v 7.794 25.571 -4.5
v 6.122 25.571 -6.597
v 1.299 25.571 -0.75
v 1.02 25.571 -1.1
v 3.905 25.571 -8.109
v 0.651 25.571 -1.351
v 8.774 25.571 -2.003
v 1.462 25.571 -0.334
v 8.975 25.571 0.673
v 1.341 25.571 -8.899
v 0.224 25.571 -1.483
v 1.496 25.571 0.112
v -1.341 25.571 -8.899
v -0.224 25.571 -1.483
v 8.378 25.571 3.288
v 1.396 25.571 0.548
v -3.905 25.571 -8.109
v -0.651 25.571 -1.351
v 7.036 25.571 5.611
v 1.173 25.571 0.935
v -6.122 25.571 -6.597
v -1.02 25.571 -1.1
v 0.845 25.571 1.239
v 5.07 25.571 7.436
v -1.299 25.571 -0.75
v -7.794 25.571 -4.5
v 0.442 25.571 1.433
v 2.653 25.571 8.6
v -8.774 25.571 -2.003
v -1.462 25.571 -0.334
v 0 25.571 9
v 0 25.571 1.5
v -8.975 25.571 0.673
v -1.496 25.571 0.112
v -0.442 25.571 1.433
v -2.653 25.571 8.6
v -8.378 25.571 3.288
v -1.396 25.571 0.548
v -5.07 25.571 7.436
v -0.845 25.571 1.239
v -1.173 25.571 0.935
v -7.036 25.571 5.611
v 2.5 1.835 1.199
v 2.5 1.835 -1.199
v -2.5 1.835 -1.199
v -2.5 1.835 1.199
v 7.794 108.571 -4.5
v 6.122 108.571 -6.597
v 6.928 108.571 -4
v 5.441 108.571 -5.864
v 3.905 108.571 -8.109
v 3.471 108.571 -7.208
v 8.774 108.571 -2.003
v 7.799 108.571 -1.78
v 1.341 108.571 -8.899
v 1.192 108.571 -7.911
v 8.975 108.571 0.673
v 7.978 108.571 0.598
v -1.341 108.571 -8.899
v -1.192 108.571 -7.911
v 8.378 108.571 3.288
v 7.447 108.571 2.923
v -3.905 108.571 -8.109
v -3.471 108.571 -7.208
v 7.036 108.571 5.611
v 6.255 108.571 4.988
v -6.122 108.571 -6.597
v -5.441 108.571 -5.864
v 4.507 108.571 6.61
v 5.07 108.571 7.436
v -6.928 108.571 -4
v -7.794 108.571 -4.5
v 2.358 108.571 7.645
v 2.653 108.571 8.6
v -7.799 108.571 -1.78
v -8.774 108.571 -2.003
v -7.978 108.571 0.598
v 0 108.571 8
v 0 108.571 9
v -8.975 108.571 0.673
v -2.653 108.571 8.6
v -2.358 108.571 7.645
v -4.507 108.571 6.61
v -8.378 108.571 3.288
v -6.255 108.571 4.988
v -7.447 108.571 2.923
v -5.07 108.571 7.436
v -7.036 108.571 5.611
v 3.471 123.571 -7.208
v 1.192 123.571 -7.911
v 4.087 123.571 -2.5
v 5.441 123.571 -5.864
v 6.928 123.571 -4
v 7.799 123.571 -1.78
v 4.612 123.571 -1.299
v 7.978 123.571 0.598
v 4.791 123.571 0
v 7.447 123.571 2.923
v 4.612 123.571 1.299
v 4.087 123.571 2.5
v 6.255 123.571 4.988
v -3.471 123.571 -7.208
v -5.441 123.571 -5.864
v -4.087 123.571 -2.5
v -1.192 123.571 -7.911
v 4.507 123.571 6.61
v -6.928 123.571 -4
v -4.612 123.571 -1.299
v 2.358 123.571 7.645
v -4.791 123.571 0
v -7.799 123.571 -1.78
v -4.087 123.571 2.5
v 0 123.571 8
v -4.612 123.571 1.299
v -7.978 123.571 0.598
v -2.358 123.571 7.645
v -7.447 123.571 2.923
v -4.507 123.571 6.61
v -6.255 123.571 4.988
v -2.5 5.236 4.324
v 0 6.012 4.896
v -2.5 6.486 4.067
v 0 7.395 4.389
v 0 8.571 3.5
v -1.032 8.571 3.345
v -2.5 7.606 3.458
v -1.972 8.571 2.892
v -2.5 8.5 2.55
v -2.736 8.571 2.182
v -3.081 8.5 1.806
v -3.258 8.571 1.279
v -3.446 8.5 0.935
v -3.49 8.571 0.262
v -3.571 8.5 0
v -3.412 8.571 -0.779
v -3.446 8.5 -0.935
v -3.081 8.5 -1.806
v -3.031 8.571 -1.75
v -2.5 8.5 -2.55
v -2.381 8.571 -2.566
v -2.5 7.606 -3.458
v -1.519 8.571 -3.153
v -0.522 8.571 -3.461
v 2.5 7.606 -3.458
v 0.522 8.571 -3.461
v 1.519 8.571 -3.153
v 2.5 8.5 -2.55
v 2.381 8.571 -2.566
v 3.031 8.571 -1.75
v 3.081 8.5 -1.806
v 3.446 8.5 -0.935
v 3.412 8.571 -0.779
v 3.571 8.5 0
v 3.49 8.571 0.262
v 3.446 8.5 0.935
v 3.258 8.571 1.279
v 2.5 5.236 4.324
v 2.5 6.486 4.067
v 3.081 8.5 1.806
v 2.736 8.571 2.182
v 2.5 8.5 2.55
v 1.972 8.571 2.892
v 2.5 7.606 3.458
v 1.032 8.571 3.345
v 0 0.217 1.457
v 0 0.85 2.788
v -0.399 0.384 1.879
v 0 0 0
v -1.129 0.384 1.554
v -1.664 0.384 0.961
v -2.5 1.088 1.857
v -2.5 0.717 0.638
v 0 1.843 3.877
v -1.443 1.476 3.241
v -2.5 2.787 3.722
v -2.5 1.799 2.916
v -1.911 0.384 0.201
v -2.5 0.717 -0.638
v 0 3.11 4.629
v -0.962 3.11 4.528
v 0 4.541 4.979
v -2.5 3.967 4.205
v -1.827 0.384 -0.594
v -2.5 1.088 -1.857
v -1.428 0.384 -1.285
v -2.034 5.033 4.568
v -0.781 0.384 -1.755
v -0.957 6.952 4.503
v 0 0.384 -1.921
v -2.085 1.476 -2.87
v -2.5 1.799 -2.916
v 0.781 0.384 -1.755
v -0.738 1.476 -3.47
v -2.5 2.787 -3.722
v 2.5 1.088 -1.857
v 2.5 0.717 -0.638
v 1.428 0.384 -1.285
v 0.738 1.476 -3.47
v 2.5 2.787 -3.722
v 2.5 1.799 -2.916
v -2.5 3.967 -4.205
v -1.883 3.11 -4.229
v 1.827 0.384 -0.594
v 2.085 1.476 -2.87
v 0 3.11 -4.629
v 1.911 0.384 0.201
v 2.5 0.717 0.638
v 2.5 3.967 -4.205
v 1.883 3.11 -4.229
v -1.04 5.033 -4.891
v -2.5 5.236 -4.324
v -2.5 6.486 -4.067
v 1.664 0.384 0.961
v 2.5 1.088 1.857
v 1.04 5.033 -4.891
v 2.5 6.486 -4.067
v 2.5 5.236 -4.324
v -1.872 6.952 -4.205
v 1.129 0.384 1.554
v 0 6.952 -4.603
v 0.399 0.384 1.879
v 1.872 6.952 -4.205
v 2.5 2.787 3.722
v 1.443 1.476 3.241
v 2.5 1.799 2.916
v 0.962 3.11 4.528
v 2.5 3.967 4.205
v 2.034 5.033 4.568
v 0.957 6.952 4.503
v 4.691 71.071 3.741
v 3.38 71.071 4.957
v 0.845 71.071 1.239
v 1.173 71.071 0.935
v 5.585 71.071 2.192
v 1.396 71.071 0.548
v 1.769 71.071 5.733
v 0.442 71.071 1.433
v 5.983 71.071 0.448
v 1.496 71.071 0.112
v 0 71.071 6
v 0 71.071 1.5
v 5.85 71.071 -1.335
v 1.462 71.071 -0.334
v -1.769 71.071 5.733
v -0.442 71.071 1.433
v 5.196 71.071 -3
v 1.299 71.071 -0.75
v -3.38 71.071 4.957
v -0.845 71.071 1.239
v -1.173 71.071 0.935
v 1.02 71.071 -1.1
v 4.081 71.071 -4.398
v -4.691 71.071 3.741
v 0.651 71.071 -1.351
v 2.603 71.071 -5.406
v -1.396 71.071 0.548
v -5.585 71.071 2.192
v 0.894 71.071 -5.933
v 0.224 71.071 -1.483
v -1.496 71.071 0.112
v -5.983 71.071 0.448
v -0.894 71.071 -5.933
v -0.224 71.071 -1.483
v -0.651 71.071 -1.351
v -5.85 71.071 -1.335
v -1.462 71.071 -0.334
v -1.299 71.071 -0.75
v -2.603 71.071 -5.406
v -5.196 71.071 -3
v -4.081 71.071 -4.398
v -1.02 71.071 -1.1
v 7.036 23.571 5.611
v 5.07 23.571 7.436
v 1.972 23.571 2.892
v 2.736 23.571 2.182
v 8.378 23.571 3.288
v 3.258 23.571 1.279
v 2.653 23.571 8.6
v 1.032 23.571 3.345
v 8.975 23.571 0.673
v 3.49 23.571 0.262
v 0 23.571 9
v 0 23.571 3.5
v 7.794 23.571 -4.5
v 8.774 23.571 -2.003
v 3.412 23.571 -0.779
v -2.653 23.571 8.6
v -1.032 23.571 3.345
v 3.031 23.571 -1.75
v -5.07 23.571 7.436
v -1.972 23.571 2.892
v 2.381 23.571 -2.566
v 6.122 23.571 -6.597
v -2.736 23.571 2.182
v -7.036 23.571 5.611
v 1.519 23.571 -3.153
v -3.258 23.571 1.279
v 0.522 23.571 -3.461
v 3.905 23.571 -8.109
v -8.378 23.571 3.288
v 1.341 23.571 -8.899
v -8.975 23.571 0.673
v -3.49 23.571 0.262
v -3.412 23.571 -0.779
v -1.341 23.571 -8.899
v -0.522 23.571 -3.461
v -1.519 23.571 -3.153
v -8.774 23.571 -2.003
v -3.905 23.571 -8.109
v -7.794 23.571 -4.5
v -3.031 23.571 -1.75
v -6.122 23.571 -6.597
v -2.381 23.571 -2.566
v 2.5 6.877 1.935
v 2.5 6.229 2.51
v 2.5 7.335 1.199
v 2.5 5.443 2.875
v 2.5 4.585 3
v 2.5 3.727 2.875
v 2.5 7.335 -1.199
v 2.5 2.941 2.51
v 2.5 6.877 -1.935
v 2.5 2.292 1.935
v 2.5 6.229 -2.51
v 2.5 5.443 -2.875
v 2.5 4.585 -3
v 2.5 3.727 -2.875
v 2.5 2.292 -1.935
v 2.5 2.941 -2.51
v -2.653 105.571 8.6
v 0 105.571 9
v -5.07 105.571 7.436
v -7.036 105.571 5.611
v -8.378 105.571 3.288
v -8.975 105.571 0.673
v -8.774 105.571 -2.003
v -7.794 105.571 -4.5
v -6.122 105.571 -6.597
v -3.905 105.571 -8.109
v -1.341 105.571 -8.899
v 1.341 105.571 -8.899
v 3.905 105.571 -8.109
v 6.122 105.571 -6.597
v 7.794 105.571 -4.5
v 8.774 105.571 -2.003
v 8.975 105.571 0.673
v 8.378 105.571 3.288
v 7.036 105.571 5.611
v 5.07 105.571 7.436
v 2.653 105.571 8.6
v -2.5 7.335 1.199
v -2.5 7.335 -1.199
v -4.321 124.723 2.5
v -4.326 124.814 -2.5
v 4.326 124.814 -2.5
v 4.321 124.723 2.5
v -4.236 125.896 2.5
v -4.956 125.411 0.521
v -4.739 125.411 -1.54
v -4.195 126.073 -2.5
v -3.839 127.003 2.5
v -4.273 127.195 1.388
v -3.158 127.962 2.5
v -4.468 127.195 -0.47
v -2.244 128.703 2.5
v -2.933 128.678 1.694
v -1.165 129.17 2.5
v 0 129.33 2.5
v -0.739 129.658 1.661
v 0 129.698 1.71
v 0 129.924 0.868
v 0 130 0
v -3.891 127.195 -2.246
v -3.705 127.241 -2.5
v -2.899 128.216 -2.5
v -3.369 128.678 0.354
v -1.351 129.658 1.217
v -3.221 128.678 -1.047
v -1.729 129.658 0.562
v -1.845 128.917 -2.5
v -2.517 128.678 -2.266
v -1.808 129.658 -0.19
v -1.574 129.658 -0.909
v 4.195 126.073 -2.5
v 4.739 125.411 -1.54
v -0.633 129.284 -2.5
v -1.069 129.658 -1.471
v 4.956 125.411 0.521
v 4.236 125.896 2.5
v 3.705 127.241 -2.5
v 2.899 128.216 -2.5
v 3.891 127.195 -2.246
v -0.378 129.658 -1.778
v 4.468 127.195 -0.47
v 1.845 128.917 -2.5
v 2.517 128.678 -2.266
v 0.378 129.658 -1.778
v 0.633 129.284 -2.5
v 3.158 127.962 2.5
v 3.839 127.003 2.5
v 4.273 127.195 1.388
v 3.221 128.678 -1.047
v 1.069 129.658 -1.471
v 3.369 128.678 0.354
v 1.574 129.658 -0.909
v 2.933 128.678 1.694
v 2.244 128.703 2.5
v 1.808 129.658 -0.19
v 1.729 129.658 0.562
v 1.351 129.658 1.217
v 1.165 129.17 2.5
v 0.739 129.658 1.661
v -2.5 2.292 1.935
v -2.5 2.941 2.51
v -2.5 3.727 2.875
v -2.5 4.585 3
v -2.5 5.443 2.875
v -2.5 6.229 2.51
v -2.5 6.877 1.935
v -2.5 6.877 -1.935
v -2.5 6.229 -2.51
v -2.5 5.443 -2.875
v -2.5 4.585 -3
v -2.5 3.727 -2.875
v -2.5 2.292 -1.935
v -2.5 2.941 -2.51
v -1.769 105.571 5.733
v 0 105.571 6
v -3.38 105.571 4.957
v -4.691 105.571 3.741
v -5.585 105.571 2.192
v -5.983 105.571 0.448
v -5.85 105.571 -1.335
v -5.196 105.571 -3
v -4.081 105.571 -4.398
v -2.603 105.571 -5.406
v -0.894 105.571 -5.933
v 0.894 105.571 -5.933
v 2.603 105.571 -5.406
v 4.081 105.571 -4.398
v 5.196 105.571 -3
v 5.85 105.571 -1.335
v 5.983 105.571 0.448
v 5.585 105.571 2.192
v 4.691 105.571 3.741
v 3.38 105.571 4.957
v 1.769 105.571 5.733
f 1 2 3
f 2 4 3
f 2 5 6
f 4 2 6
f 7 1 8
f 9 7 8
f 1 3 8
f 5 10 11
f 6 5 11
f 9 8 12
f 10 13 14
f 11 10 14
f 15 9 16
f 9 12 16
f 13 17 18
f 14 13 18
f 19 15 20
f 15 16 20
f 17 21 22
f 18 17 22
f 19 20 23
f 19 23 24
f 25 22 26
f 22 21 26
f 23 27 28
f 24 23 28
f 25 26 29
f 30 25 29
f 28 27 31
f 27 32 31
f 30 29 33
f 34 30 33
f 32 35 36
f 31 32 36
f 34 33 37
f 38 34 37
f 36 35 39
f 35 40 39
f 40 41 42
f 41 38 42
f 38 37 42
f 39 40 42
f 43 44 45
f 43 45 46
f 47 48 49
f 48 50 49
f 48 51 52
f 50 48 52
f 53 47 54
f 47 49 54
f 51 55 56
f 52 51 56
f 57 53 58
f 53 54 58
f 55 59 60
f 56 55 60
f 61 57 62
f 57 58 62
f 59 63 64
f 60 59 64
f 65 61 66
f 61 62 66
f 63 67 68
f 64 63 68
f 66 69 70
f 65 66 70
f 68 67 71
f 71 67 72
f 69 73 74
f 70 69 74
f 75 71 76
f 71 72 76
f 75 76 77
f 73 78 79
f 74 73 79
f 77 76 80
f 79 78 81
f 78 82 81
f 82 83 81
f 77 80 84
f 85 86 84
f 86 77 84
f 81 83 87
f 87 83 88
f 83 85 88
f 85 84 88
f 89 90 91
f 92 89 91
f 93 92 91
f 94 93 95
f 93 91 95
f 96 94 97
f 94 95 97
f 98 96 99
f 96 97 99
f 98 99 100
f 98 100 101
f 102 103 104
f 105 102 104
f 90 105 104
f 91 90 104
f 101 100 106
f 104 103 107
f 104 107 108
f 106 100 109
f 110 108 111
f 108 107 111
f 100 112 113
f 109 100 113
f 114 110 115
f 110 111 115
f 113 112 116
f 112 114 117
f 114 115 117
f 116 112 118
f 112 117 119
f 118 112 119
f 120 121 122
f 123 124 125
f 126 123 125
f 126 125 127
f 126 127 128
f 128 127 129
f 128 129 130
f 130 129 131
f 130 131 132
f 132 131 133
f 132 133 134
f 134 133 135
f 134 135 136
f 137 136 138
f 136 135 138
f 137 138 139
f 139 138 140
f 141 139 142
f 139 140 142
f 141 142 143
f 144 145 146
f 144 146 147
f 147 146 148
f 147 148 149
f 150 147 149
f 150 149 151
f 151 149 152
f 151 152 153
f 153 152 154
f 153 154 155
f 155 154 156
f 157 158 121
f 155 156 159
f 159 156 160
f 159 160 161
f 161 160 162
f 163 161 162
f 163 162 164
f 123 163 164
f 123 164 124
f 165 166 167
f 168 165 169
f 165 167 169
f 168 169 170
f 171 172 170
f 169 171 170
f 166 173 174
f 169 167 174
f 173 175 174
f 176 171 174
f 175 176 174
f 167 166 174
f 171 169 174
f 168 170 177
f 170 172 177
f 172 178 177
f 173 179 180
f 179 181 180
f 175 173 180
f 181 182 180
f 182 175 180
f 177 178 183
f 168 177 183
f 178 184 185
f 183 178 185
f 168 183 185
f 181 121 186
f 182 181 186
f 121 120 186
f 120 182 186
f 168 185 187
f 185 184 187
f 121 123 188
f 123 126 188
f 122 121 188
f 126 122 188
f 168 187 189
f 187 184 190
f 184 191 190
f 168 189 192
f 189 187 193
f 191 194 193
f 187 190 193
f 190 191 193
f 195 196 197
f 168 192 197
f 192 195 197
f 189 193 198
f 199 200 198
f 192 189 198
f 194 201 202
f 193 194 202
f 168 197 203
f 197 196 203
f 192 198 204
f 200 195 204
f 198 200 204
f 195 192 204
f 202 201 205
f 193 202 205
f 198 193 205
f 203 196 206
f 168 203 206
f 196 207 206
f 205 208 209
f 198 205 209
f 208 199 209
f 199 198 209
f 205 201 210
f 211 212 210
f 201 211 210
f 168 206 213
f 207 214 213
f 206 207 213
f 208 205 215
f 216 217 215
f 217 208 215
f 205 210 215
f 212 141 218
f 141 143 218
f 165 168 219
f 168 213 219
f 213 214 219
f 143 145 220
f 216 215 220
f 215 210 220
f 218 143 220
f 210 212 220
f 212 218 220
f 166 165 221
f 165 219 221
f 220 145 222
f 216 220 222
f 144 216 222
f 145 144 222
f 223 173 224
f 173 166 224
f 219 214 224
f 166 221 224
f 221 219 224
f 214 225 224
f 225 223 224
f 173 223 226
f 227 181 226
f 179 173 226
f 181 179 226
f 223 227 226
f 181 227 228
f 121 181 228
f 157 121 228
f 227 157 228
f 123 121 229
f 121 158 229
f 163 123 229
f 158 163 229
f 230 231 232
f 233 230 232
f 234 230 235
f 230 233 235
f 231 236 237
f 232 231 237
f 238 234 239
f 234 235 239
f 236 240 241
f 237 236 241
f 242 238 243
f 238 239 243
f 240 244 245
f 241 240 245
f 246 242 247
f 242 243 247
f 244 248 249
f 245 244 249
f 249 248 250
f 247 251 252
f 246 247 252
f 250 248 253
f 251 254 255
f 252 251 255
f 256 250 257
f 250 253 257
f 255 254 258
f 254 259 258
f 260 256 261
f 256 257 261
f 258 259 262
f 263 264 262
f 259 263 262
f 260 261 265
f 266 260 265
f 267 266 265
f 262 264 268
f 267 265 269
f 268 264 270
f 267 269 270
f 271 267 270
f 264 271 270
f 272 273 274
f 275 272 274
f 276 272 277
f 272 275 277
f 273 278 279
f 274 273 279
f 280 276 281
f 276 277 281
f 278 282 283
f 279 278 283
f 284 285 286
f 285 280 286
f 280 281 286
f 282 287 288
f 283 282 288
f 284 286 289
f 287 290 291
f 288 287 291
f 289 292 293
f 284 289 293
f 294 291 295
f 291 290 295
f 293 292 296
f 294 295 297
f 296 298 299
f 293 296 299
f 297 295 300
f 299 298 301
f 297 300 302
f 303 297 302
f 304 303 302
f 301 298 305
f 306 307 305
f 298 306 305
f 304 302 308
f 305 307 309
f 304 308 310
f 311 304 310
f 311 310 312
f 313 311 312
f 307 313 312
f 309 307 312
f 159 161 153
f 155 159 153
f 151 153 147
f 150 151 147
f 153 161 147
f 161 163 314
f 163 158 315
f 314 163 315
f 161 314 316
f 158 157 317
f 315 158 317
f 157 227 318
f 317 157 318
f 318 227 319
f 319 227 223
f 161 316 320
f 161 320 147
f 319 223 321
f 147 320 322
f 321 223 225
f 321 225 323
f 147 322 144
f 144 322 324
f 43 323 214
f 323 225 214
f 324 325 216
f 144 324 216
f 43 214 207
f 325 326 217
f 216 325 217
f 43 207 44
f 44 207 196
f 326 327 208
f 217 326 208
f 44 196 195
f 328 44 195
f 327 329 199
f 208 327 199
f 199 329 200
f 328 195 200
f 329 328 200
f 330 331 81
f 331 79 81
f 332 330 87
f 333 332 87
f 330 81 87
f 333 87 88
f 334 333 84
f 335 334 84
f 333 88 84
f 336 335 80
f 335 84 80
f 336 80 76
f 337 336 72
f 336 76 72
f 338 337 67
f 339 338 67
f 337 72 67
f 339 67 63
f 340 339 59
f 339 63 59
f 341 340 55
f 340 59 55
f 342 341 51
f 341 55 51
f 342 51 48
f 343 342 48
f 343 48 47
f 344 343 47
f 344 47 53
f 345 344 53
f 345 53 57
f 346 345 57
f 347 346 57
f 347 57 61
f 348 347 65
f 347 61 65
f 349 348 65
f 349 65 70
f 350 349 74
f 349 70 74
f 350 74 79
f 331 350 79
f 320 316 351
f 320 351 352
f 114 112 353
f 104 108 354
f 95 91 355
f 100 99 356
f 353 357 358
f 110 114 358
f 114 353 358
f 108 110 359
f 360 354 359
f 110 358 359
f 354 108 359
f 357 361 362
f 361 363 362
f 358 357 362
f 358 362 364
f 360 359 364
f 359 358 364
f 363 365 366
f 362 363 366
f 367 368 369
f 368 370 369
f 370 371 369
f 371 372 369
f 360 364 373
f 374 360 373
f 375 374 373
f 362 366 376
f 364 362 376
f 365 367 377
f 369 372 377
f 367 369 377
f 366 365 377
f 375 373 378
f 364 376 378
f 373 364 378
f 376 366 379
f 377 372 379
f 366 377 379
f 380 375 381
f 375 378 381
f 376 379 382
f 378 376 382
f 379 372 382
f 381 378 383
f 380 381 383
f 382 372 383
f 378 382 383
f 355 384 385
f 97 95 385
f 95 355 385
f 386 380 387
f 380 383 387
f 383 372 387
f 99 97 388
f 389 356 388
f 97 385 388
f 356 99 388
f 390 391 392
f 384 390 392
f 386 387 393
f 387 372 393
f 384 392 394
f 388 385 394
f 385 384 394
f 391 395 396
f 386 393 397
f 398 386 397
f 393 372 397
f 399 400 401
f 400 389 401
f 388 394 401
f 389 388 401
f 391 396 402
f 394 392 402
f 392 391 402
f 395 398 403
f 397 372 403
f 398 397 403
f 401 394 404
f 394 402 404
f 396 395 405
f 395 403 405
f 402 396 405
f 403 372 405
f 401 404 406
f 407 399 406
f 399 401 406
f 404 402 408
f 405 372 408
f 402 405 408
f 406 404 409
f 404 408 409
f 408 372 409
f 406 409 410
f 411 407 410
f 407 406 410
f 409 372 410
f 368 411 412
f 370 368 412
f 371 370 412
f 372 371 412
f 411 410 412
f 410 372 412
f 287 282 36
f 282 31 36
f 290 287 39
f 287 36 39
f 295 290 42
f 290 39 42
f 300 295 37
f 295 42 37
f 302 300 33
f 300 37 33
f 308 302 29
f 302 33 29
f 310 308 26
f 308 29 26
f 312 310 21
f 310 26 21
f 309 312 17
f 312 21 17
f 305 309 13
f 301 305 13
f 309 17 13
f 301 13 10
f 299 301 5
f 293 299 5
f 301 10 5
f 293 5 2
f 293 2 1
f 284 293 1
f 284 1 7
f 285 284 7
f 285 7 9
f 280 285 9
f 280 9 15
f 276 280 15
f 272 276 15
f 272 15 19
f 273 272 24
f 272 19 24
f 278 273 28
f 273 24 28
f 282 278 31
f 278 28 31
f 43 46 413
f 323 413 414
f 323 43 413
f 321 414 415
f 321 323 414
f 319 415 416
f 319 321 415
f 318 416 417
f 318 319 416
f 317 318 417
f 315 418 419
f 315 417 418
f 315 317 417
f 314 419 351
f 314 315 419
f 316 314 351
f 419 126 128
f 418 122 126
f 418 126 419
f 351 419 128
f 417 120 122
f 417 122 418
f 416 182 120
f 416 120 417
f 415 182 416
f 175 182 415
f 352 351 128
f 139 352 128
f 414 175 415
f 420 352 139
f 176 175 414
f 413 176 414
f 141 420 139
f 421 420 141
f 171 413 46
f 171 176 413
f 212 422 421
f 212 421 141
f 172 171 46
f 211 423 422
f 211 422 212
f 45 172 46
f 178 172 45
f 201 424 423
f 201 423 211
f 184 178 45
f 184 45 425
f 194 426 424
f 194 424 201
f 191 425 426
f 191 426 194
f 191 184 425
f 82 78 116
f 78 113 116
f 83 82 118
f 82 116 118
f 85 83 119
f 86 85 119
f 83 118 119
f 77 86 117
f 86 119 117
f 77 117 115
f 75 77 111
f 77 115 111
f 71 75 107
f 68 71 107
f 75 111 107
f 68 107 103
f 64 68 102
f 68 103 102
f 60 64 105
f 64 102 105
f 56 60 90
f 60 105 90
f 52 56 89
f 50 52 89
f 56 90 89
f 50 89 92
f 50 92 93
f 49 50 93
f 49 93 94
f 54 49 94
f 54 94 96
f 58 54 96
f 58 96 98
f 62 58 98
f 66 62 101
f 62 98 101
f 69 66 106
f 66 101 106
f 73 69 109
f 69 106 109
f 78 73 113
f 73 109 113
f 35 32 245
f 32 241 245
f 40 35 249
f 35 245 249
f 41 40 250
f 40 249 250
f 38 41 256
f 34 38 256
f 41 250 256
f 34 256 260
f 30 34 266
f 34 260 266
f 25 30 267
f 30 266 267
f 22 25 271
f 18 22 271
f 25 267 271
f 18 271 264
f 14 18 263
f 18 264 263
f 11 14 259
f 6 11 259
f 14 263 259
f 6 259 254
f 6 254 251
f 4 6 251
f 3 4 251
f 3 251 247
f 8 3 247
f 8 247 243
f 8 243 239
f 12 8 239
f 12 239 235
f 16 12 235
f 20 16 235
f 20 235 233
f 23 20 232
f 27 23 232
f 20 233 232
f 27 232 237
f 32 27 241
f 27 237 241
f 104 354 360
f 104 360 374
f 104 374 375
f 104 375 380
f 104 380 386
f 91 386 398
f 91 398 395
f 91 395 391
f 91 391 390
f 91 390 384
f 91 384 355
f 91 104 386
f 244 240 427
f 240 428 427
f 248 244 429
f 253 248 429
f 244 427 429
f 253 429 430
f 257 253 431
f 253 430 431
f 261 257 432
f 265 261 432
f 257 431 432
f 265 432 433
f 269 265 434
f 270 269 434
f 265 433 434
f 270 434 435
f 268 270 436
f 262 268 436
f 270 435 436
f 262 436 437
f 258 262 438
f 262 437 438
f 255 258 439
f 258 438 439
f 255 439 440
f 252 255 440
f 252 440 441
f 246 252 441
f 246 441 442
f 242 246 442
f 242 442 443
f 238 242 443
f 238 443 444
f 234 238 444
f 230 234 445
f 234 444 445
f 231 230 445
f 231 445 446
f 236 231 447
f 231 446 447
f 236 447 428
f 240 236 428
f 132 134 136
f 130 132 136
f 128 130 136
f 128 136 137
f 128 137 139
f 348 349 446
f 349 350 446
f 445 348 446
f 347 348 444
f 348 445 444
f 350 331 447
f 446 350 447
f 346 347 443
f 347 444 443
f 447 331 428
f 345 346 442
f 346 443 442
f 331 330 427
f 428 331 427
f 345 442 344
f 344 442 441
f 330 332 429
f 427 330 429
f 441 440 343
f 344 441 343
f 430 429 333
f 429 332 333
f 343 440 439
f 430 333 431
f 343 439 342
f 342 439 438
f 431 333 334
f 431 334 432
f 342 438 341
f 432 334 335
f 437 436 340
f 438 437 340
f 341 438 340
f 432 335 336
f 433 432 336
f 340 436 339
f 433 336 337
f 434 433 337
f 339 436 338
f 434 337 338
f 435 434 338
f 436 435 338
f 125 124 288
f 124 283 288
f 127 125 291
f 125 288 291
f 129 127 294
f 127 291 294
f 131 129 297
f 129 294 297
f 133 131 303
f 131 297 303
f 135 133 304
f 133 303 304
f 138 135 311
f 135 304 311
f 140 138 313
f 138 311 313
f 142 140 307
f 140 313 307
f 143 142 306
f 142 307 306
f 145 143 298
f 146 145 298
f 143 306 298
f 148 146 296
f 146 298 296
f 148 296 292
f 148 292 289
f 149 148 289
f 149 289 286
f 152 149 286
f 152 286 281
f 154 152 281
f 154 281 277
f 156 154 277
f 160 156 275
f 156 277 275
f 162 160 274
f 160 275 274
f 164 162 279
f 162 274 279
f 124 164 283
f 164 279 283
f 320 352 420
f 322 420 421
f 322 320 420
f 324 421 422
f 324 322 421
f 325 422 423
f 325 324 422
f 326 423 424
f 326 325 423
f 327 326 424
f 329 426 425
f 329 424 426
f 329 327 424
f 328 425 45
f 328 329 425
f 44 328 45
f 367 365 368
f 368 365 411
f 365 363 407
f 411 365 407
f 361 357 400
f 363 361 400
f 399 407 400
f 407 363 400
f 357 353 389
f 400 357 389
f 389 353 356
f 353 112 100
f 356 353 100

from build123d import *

# Parameters (mm, degrees)
SKETCH_2_OUTSIDE_W   = 46.494
SKETCH_2_OUTSIDE_H   = 46.494
SKETCH_2_OUTSIDE_W_2 = 10
SKETCH_2_OUTSIDE_H_2 = 5
CUT_EXTRUDE_1_DEPTH  = 10
SKETCH_3_OUTSIDE_W   = 46.494
SKETCH_3_OUTSIDE_H   = 46.494
SKETCH_3_OUTSIDE_W_2 = 5
SKETCH_3_OUTSIDE_H_2 = 20
CUT_EXTRUDE_2_DEPTH  = 8.5
CUT_EXTRUDE_3_DEPTH  = 131.817621137


with BuildPart() as part:
    # Эскиз1 → Повернуть2 (revolve)
    with BuildSketch(Plane.XY, mode=Mode.PRIVATE) as revolve_2_sk:
        with BuildLine():
            Line((-3.5, 8.570714214), (-3.5, 23.570714214))
            Line((-3.5, 23.570714214), (-9, 23.570714214))
            Line((-9, 23.570714214), (-9, 25.570714214))
            Line((-9, 25.570714214), (-1.5, 25.570714214))
            Line((-1.5, 25.570714214), (-1.5, 71.070714214))
            Line((-1.5, 71.070714214), (-6, 71.070714214))
            Line((-6, 71.070714214), (-6, 105.570714214))
            Line((-6, 105.570714214), (-9, 105.570714214))
            Line((-9, 105.570714214), (-9, 108.570714214))
            Line((-9, 108.570714214), (-8, 108.570714214))
            Line((-8, 108.570714214), (-8, 123.570714214))
            Line((-8, 123.570714214), (-4.791361199, 123.570714214))
            ThreePointArc((-4.791361199, 123.570714214), (-4.009141362, 127.987772671), (0, 130))
            Line((0, 130), (0, 125))
            Line((0, 125), (0, 0))
            ThreePointArc((0, 0), (-4.628907596, 3.109705191), (-3.5, 8.570714214))
        make_face()
    revolve(revolve_2_sk.sketch.rotate(Axis((0, 125, 0), (0, -1, 0)), 270), axis=Axis((0, 125, 0), (0, -1, 0)))

    # Эскиз2 outside → Вырез-Вытянуть1 (cut)
    with BuildSketch(Plane(origin=(0, 123.570714214, 0), x_dir=(1, 0, 0), z_dir=(0, 1, 0))):
        Rectangle(SKETCH_2_OUTSIDE_W, SKETCH_2_OUTSIDE_H)
        Rectangle(SKETCH_2_OUTSIDE_W_2, SKETCH_2_OUTSIDE_H_2, mode=Mode.SUBTRACT)
    extrude(amount=CUT_EXTRUDE_1_DEPTH, mode=Mode.SUBTRACT)

    # Эскиз3 outside → Вырез-Вытянуть2 (cut)
    with BuildSketch(Plane(origin=(0, 0, 0), x_dir=(1, 0, 0), z_dir=(0, 1, 0))):
        Rectangle(SKETCH_3_OUTSIDE_W, SKETCH_3_OUTSIDE_H)
        Rectangle(SKETCH_3_OUTSIDE_W_2, SKETCH_3_OUTSIDE_H_2, mode=Mode.SUBTRACT)
    extrude(amount=CUT_EXTRUDE_2_DEPTH, mode=Mode.SUBTRACT)

    # Эскиз4 → Вырез-Вытянуть3 (cut, through all)
    with BuildSketch(Plane(origin=(2.5, 0, 0), x_dir=(0, 0, -1), z_dir=(1, 0, 0))):
        with BuildLine():
            Line((-1.198957881, 7.334936491), (1.198957881, 7.334936491))
            ThreePointArc((1.198957881, 7.334936491), (3, 4.584936491), (1.198957881, 1.834936491))
            Line((1.198957881, 1.834936491), (-1.198957881, 1.834936491))
            ThreePointArc((-1.198957881, 1.834936491), (-3, 4.584936491), (-1.198957881, 7.334936491))
        make_face()
    extrude(amount=-CUT_EXTRUDE_3_DEPTH, mode=Mode.SUBTRACT)


solid = part.part
